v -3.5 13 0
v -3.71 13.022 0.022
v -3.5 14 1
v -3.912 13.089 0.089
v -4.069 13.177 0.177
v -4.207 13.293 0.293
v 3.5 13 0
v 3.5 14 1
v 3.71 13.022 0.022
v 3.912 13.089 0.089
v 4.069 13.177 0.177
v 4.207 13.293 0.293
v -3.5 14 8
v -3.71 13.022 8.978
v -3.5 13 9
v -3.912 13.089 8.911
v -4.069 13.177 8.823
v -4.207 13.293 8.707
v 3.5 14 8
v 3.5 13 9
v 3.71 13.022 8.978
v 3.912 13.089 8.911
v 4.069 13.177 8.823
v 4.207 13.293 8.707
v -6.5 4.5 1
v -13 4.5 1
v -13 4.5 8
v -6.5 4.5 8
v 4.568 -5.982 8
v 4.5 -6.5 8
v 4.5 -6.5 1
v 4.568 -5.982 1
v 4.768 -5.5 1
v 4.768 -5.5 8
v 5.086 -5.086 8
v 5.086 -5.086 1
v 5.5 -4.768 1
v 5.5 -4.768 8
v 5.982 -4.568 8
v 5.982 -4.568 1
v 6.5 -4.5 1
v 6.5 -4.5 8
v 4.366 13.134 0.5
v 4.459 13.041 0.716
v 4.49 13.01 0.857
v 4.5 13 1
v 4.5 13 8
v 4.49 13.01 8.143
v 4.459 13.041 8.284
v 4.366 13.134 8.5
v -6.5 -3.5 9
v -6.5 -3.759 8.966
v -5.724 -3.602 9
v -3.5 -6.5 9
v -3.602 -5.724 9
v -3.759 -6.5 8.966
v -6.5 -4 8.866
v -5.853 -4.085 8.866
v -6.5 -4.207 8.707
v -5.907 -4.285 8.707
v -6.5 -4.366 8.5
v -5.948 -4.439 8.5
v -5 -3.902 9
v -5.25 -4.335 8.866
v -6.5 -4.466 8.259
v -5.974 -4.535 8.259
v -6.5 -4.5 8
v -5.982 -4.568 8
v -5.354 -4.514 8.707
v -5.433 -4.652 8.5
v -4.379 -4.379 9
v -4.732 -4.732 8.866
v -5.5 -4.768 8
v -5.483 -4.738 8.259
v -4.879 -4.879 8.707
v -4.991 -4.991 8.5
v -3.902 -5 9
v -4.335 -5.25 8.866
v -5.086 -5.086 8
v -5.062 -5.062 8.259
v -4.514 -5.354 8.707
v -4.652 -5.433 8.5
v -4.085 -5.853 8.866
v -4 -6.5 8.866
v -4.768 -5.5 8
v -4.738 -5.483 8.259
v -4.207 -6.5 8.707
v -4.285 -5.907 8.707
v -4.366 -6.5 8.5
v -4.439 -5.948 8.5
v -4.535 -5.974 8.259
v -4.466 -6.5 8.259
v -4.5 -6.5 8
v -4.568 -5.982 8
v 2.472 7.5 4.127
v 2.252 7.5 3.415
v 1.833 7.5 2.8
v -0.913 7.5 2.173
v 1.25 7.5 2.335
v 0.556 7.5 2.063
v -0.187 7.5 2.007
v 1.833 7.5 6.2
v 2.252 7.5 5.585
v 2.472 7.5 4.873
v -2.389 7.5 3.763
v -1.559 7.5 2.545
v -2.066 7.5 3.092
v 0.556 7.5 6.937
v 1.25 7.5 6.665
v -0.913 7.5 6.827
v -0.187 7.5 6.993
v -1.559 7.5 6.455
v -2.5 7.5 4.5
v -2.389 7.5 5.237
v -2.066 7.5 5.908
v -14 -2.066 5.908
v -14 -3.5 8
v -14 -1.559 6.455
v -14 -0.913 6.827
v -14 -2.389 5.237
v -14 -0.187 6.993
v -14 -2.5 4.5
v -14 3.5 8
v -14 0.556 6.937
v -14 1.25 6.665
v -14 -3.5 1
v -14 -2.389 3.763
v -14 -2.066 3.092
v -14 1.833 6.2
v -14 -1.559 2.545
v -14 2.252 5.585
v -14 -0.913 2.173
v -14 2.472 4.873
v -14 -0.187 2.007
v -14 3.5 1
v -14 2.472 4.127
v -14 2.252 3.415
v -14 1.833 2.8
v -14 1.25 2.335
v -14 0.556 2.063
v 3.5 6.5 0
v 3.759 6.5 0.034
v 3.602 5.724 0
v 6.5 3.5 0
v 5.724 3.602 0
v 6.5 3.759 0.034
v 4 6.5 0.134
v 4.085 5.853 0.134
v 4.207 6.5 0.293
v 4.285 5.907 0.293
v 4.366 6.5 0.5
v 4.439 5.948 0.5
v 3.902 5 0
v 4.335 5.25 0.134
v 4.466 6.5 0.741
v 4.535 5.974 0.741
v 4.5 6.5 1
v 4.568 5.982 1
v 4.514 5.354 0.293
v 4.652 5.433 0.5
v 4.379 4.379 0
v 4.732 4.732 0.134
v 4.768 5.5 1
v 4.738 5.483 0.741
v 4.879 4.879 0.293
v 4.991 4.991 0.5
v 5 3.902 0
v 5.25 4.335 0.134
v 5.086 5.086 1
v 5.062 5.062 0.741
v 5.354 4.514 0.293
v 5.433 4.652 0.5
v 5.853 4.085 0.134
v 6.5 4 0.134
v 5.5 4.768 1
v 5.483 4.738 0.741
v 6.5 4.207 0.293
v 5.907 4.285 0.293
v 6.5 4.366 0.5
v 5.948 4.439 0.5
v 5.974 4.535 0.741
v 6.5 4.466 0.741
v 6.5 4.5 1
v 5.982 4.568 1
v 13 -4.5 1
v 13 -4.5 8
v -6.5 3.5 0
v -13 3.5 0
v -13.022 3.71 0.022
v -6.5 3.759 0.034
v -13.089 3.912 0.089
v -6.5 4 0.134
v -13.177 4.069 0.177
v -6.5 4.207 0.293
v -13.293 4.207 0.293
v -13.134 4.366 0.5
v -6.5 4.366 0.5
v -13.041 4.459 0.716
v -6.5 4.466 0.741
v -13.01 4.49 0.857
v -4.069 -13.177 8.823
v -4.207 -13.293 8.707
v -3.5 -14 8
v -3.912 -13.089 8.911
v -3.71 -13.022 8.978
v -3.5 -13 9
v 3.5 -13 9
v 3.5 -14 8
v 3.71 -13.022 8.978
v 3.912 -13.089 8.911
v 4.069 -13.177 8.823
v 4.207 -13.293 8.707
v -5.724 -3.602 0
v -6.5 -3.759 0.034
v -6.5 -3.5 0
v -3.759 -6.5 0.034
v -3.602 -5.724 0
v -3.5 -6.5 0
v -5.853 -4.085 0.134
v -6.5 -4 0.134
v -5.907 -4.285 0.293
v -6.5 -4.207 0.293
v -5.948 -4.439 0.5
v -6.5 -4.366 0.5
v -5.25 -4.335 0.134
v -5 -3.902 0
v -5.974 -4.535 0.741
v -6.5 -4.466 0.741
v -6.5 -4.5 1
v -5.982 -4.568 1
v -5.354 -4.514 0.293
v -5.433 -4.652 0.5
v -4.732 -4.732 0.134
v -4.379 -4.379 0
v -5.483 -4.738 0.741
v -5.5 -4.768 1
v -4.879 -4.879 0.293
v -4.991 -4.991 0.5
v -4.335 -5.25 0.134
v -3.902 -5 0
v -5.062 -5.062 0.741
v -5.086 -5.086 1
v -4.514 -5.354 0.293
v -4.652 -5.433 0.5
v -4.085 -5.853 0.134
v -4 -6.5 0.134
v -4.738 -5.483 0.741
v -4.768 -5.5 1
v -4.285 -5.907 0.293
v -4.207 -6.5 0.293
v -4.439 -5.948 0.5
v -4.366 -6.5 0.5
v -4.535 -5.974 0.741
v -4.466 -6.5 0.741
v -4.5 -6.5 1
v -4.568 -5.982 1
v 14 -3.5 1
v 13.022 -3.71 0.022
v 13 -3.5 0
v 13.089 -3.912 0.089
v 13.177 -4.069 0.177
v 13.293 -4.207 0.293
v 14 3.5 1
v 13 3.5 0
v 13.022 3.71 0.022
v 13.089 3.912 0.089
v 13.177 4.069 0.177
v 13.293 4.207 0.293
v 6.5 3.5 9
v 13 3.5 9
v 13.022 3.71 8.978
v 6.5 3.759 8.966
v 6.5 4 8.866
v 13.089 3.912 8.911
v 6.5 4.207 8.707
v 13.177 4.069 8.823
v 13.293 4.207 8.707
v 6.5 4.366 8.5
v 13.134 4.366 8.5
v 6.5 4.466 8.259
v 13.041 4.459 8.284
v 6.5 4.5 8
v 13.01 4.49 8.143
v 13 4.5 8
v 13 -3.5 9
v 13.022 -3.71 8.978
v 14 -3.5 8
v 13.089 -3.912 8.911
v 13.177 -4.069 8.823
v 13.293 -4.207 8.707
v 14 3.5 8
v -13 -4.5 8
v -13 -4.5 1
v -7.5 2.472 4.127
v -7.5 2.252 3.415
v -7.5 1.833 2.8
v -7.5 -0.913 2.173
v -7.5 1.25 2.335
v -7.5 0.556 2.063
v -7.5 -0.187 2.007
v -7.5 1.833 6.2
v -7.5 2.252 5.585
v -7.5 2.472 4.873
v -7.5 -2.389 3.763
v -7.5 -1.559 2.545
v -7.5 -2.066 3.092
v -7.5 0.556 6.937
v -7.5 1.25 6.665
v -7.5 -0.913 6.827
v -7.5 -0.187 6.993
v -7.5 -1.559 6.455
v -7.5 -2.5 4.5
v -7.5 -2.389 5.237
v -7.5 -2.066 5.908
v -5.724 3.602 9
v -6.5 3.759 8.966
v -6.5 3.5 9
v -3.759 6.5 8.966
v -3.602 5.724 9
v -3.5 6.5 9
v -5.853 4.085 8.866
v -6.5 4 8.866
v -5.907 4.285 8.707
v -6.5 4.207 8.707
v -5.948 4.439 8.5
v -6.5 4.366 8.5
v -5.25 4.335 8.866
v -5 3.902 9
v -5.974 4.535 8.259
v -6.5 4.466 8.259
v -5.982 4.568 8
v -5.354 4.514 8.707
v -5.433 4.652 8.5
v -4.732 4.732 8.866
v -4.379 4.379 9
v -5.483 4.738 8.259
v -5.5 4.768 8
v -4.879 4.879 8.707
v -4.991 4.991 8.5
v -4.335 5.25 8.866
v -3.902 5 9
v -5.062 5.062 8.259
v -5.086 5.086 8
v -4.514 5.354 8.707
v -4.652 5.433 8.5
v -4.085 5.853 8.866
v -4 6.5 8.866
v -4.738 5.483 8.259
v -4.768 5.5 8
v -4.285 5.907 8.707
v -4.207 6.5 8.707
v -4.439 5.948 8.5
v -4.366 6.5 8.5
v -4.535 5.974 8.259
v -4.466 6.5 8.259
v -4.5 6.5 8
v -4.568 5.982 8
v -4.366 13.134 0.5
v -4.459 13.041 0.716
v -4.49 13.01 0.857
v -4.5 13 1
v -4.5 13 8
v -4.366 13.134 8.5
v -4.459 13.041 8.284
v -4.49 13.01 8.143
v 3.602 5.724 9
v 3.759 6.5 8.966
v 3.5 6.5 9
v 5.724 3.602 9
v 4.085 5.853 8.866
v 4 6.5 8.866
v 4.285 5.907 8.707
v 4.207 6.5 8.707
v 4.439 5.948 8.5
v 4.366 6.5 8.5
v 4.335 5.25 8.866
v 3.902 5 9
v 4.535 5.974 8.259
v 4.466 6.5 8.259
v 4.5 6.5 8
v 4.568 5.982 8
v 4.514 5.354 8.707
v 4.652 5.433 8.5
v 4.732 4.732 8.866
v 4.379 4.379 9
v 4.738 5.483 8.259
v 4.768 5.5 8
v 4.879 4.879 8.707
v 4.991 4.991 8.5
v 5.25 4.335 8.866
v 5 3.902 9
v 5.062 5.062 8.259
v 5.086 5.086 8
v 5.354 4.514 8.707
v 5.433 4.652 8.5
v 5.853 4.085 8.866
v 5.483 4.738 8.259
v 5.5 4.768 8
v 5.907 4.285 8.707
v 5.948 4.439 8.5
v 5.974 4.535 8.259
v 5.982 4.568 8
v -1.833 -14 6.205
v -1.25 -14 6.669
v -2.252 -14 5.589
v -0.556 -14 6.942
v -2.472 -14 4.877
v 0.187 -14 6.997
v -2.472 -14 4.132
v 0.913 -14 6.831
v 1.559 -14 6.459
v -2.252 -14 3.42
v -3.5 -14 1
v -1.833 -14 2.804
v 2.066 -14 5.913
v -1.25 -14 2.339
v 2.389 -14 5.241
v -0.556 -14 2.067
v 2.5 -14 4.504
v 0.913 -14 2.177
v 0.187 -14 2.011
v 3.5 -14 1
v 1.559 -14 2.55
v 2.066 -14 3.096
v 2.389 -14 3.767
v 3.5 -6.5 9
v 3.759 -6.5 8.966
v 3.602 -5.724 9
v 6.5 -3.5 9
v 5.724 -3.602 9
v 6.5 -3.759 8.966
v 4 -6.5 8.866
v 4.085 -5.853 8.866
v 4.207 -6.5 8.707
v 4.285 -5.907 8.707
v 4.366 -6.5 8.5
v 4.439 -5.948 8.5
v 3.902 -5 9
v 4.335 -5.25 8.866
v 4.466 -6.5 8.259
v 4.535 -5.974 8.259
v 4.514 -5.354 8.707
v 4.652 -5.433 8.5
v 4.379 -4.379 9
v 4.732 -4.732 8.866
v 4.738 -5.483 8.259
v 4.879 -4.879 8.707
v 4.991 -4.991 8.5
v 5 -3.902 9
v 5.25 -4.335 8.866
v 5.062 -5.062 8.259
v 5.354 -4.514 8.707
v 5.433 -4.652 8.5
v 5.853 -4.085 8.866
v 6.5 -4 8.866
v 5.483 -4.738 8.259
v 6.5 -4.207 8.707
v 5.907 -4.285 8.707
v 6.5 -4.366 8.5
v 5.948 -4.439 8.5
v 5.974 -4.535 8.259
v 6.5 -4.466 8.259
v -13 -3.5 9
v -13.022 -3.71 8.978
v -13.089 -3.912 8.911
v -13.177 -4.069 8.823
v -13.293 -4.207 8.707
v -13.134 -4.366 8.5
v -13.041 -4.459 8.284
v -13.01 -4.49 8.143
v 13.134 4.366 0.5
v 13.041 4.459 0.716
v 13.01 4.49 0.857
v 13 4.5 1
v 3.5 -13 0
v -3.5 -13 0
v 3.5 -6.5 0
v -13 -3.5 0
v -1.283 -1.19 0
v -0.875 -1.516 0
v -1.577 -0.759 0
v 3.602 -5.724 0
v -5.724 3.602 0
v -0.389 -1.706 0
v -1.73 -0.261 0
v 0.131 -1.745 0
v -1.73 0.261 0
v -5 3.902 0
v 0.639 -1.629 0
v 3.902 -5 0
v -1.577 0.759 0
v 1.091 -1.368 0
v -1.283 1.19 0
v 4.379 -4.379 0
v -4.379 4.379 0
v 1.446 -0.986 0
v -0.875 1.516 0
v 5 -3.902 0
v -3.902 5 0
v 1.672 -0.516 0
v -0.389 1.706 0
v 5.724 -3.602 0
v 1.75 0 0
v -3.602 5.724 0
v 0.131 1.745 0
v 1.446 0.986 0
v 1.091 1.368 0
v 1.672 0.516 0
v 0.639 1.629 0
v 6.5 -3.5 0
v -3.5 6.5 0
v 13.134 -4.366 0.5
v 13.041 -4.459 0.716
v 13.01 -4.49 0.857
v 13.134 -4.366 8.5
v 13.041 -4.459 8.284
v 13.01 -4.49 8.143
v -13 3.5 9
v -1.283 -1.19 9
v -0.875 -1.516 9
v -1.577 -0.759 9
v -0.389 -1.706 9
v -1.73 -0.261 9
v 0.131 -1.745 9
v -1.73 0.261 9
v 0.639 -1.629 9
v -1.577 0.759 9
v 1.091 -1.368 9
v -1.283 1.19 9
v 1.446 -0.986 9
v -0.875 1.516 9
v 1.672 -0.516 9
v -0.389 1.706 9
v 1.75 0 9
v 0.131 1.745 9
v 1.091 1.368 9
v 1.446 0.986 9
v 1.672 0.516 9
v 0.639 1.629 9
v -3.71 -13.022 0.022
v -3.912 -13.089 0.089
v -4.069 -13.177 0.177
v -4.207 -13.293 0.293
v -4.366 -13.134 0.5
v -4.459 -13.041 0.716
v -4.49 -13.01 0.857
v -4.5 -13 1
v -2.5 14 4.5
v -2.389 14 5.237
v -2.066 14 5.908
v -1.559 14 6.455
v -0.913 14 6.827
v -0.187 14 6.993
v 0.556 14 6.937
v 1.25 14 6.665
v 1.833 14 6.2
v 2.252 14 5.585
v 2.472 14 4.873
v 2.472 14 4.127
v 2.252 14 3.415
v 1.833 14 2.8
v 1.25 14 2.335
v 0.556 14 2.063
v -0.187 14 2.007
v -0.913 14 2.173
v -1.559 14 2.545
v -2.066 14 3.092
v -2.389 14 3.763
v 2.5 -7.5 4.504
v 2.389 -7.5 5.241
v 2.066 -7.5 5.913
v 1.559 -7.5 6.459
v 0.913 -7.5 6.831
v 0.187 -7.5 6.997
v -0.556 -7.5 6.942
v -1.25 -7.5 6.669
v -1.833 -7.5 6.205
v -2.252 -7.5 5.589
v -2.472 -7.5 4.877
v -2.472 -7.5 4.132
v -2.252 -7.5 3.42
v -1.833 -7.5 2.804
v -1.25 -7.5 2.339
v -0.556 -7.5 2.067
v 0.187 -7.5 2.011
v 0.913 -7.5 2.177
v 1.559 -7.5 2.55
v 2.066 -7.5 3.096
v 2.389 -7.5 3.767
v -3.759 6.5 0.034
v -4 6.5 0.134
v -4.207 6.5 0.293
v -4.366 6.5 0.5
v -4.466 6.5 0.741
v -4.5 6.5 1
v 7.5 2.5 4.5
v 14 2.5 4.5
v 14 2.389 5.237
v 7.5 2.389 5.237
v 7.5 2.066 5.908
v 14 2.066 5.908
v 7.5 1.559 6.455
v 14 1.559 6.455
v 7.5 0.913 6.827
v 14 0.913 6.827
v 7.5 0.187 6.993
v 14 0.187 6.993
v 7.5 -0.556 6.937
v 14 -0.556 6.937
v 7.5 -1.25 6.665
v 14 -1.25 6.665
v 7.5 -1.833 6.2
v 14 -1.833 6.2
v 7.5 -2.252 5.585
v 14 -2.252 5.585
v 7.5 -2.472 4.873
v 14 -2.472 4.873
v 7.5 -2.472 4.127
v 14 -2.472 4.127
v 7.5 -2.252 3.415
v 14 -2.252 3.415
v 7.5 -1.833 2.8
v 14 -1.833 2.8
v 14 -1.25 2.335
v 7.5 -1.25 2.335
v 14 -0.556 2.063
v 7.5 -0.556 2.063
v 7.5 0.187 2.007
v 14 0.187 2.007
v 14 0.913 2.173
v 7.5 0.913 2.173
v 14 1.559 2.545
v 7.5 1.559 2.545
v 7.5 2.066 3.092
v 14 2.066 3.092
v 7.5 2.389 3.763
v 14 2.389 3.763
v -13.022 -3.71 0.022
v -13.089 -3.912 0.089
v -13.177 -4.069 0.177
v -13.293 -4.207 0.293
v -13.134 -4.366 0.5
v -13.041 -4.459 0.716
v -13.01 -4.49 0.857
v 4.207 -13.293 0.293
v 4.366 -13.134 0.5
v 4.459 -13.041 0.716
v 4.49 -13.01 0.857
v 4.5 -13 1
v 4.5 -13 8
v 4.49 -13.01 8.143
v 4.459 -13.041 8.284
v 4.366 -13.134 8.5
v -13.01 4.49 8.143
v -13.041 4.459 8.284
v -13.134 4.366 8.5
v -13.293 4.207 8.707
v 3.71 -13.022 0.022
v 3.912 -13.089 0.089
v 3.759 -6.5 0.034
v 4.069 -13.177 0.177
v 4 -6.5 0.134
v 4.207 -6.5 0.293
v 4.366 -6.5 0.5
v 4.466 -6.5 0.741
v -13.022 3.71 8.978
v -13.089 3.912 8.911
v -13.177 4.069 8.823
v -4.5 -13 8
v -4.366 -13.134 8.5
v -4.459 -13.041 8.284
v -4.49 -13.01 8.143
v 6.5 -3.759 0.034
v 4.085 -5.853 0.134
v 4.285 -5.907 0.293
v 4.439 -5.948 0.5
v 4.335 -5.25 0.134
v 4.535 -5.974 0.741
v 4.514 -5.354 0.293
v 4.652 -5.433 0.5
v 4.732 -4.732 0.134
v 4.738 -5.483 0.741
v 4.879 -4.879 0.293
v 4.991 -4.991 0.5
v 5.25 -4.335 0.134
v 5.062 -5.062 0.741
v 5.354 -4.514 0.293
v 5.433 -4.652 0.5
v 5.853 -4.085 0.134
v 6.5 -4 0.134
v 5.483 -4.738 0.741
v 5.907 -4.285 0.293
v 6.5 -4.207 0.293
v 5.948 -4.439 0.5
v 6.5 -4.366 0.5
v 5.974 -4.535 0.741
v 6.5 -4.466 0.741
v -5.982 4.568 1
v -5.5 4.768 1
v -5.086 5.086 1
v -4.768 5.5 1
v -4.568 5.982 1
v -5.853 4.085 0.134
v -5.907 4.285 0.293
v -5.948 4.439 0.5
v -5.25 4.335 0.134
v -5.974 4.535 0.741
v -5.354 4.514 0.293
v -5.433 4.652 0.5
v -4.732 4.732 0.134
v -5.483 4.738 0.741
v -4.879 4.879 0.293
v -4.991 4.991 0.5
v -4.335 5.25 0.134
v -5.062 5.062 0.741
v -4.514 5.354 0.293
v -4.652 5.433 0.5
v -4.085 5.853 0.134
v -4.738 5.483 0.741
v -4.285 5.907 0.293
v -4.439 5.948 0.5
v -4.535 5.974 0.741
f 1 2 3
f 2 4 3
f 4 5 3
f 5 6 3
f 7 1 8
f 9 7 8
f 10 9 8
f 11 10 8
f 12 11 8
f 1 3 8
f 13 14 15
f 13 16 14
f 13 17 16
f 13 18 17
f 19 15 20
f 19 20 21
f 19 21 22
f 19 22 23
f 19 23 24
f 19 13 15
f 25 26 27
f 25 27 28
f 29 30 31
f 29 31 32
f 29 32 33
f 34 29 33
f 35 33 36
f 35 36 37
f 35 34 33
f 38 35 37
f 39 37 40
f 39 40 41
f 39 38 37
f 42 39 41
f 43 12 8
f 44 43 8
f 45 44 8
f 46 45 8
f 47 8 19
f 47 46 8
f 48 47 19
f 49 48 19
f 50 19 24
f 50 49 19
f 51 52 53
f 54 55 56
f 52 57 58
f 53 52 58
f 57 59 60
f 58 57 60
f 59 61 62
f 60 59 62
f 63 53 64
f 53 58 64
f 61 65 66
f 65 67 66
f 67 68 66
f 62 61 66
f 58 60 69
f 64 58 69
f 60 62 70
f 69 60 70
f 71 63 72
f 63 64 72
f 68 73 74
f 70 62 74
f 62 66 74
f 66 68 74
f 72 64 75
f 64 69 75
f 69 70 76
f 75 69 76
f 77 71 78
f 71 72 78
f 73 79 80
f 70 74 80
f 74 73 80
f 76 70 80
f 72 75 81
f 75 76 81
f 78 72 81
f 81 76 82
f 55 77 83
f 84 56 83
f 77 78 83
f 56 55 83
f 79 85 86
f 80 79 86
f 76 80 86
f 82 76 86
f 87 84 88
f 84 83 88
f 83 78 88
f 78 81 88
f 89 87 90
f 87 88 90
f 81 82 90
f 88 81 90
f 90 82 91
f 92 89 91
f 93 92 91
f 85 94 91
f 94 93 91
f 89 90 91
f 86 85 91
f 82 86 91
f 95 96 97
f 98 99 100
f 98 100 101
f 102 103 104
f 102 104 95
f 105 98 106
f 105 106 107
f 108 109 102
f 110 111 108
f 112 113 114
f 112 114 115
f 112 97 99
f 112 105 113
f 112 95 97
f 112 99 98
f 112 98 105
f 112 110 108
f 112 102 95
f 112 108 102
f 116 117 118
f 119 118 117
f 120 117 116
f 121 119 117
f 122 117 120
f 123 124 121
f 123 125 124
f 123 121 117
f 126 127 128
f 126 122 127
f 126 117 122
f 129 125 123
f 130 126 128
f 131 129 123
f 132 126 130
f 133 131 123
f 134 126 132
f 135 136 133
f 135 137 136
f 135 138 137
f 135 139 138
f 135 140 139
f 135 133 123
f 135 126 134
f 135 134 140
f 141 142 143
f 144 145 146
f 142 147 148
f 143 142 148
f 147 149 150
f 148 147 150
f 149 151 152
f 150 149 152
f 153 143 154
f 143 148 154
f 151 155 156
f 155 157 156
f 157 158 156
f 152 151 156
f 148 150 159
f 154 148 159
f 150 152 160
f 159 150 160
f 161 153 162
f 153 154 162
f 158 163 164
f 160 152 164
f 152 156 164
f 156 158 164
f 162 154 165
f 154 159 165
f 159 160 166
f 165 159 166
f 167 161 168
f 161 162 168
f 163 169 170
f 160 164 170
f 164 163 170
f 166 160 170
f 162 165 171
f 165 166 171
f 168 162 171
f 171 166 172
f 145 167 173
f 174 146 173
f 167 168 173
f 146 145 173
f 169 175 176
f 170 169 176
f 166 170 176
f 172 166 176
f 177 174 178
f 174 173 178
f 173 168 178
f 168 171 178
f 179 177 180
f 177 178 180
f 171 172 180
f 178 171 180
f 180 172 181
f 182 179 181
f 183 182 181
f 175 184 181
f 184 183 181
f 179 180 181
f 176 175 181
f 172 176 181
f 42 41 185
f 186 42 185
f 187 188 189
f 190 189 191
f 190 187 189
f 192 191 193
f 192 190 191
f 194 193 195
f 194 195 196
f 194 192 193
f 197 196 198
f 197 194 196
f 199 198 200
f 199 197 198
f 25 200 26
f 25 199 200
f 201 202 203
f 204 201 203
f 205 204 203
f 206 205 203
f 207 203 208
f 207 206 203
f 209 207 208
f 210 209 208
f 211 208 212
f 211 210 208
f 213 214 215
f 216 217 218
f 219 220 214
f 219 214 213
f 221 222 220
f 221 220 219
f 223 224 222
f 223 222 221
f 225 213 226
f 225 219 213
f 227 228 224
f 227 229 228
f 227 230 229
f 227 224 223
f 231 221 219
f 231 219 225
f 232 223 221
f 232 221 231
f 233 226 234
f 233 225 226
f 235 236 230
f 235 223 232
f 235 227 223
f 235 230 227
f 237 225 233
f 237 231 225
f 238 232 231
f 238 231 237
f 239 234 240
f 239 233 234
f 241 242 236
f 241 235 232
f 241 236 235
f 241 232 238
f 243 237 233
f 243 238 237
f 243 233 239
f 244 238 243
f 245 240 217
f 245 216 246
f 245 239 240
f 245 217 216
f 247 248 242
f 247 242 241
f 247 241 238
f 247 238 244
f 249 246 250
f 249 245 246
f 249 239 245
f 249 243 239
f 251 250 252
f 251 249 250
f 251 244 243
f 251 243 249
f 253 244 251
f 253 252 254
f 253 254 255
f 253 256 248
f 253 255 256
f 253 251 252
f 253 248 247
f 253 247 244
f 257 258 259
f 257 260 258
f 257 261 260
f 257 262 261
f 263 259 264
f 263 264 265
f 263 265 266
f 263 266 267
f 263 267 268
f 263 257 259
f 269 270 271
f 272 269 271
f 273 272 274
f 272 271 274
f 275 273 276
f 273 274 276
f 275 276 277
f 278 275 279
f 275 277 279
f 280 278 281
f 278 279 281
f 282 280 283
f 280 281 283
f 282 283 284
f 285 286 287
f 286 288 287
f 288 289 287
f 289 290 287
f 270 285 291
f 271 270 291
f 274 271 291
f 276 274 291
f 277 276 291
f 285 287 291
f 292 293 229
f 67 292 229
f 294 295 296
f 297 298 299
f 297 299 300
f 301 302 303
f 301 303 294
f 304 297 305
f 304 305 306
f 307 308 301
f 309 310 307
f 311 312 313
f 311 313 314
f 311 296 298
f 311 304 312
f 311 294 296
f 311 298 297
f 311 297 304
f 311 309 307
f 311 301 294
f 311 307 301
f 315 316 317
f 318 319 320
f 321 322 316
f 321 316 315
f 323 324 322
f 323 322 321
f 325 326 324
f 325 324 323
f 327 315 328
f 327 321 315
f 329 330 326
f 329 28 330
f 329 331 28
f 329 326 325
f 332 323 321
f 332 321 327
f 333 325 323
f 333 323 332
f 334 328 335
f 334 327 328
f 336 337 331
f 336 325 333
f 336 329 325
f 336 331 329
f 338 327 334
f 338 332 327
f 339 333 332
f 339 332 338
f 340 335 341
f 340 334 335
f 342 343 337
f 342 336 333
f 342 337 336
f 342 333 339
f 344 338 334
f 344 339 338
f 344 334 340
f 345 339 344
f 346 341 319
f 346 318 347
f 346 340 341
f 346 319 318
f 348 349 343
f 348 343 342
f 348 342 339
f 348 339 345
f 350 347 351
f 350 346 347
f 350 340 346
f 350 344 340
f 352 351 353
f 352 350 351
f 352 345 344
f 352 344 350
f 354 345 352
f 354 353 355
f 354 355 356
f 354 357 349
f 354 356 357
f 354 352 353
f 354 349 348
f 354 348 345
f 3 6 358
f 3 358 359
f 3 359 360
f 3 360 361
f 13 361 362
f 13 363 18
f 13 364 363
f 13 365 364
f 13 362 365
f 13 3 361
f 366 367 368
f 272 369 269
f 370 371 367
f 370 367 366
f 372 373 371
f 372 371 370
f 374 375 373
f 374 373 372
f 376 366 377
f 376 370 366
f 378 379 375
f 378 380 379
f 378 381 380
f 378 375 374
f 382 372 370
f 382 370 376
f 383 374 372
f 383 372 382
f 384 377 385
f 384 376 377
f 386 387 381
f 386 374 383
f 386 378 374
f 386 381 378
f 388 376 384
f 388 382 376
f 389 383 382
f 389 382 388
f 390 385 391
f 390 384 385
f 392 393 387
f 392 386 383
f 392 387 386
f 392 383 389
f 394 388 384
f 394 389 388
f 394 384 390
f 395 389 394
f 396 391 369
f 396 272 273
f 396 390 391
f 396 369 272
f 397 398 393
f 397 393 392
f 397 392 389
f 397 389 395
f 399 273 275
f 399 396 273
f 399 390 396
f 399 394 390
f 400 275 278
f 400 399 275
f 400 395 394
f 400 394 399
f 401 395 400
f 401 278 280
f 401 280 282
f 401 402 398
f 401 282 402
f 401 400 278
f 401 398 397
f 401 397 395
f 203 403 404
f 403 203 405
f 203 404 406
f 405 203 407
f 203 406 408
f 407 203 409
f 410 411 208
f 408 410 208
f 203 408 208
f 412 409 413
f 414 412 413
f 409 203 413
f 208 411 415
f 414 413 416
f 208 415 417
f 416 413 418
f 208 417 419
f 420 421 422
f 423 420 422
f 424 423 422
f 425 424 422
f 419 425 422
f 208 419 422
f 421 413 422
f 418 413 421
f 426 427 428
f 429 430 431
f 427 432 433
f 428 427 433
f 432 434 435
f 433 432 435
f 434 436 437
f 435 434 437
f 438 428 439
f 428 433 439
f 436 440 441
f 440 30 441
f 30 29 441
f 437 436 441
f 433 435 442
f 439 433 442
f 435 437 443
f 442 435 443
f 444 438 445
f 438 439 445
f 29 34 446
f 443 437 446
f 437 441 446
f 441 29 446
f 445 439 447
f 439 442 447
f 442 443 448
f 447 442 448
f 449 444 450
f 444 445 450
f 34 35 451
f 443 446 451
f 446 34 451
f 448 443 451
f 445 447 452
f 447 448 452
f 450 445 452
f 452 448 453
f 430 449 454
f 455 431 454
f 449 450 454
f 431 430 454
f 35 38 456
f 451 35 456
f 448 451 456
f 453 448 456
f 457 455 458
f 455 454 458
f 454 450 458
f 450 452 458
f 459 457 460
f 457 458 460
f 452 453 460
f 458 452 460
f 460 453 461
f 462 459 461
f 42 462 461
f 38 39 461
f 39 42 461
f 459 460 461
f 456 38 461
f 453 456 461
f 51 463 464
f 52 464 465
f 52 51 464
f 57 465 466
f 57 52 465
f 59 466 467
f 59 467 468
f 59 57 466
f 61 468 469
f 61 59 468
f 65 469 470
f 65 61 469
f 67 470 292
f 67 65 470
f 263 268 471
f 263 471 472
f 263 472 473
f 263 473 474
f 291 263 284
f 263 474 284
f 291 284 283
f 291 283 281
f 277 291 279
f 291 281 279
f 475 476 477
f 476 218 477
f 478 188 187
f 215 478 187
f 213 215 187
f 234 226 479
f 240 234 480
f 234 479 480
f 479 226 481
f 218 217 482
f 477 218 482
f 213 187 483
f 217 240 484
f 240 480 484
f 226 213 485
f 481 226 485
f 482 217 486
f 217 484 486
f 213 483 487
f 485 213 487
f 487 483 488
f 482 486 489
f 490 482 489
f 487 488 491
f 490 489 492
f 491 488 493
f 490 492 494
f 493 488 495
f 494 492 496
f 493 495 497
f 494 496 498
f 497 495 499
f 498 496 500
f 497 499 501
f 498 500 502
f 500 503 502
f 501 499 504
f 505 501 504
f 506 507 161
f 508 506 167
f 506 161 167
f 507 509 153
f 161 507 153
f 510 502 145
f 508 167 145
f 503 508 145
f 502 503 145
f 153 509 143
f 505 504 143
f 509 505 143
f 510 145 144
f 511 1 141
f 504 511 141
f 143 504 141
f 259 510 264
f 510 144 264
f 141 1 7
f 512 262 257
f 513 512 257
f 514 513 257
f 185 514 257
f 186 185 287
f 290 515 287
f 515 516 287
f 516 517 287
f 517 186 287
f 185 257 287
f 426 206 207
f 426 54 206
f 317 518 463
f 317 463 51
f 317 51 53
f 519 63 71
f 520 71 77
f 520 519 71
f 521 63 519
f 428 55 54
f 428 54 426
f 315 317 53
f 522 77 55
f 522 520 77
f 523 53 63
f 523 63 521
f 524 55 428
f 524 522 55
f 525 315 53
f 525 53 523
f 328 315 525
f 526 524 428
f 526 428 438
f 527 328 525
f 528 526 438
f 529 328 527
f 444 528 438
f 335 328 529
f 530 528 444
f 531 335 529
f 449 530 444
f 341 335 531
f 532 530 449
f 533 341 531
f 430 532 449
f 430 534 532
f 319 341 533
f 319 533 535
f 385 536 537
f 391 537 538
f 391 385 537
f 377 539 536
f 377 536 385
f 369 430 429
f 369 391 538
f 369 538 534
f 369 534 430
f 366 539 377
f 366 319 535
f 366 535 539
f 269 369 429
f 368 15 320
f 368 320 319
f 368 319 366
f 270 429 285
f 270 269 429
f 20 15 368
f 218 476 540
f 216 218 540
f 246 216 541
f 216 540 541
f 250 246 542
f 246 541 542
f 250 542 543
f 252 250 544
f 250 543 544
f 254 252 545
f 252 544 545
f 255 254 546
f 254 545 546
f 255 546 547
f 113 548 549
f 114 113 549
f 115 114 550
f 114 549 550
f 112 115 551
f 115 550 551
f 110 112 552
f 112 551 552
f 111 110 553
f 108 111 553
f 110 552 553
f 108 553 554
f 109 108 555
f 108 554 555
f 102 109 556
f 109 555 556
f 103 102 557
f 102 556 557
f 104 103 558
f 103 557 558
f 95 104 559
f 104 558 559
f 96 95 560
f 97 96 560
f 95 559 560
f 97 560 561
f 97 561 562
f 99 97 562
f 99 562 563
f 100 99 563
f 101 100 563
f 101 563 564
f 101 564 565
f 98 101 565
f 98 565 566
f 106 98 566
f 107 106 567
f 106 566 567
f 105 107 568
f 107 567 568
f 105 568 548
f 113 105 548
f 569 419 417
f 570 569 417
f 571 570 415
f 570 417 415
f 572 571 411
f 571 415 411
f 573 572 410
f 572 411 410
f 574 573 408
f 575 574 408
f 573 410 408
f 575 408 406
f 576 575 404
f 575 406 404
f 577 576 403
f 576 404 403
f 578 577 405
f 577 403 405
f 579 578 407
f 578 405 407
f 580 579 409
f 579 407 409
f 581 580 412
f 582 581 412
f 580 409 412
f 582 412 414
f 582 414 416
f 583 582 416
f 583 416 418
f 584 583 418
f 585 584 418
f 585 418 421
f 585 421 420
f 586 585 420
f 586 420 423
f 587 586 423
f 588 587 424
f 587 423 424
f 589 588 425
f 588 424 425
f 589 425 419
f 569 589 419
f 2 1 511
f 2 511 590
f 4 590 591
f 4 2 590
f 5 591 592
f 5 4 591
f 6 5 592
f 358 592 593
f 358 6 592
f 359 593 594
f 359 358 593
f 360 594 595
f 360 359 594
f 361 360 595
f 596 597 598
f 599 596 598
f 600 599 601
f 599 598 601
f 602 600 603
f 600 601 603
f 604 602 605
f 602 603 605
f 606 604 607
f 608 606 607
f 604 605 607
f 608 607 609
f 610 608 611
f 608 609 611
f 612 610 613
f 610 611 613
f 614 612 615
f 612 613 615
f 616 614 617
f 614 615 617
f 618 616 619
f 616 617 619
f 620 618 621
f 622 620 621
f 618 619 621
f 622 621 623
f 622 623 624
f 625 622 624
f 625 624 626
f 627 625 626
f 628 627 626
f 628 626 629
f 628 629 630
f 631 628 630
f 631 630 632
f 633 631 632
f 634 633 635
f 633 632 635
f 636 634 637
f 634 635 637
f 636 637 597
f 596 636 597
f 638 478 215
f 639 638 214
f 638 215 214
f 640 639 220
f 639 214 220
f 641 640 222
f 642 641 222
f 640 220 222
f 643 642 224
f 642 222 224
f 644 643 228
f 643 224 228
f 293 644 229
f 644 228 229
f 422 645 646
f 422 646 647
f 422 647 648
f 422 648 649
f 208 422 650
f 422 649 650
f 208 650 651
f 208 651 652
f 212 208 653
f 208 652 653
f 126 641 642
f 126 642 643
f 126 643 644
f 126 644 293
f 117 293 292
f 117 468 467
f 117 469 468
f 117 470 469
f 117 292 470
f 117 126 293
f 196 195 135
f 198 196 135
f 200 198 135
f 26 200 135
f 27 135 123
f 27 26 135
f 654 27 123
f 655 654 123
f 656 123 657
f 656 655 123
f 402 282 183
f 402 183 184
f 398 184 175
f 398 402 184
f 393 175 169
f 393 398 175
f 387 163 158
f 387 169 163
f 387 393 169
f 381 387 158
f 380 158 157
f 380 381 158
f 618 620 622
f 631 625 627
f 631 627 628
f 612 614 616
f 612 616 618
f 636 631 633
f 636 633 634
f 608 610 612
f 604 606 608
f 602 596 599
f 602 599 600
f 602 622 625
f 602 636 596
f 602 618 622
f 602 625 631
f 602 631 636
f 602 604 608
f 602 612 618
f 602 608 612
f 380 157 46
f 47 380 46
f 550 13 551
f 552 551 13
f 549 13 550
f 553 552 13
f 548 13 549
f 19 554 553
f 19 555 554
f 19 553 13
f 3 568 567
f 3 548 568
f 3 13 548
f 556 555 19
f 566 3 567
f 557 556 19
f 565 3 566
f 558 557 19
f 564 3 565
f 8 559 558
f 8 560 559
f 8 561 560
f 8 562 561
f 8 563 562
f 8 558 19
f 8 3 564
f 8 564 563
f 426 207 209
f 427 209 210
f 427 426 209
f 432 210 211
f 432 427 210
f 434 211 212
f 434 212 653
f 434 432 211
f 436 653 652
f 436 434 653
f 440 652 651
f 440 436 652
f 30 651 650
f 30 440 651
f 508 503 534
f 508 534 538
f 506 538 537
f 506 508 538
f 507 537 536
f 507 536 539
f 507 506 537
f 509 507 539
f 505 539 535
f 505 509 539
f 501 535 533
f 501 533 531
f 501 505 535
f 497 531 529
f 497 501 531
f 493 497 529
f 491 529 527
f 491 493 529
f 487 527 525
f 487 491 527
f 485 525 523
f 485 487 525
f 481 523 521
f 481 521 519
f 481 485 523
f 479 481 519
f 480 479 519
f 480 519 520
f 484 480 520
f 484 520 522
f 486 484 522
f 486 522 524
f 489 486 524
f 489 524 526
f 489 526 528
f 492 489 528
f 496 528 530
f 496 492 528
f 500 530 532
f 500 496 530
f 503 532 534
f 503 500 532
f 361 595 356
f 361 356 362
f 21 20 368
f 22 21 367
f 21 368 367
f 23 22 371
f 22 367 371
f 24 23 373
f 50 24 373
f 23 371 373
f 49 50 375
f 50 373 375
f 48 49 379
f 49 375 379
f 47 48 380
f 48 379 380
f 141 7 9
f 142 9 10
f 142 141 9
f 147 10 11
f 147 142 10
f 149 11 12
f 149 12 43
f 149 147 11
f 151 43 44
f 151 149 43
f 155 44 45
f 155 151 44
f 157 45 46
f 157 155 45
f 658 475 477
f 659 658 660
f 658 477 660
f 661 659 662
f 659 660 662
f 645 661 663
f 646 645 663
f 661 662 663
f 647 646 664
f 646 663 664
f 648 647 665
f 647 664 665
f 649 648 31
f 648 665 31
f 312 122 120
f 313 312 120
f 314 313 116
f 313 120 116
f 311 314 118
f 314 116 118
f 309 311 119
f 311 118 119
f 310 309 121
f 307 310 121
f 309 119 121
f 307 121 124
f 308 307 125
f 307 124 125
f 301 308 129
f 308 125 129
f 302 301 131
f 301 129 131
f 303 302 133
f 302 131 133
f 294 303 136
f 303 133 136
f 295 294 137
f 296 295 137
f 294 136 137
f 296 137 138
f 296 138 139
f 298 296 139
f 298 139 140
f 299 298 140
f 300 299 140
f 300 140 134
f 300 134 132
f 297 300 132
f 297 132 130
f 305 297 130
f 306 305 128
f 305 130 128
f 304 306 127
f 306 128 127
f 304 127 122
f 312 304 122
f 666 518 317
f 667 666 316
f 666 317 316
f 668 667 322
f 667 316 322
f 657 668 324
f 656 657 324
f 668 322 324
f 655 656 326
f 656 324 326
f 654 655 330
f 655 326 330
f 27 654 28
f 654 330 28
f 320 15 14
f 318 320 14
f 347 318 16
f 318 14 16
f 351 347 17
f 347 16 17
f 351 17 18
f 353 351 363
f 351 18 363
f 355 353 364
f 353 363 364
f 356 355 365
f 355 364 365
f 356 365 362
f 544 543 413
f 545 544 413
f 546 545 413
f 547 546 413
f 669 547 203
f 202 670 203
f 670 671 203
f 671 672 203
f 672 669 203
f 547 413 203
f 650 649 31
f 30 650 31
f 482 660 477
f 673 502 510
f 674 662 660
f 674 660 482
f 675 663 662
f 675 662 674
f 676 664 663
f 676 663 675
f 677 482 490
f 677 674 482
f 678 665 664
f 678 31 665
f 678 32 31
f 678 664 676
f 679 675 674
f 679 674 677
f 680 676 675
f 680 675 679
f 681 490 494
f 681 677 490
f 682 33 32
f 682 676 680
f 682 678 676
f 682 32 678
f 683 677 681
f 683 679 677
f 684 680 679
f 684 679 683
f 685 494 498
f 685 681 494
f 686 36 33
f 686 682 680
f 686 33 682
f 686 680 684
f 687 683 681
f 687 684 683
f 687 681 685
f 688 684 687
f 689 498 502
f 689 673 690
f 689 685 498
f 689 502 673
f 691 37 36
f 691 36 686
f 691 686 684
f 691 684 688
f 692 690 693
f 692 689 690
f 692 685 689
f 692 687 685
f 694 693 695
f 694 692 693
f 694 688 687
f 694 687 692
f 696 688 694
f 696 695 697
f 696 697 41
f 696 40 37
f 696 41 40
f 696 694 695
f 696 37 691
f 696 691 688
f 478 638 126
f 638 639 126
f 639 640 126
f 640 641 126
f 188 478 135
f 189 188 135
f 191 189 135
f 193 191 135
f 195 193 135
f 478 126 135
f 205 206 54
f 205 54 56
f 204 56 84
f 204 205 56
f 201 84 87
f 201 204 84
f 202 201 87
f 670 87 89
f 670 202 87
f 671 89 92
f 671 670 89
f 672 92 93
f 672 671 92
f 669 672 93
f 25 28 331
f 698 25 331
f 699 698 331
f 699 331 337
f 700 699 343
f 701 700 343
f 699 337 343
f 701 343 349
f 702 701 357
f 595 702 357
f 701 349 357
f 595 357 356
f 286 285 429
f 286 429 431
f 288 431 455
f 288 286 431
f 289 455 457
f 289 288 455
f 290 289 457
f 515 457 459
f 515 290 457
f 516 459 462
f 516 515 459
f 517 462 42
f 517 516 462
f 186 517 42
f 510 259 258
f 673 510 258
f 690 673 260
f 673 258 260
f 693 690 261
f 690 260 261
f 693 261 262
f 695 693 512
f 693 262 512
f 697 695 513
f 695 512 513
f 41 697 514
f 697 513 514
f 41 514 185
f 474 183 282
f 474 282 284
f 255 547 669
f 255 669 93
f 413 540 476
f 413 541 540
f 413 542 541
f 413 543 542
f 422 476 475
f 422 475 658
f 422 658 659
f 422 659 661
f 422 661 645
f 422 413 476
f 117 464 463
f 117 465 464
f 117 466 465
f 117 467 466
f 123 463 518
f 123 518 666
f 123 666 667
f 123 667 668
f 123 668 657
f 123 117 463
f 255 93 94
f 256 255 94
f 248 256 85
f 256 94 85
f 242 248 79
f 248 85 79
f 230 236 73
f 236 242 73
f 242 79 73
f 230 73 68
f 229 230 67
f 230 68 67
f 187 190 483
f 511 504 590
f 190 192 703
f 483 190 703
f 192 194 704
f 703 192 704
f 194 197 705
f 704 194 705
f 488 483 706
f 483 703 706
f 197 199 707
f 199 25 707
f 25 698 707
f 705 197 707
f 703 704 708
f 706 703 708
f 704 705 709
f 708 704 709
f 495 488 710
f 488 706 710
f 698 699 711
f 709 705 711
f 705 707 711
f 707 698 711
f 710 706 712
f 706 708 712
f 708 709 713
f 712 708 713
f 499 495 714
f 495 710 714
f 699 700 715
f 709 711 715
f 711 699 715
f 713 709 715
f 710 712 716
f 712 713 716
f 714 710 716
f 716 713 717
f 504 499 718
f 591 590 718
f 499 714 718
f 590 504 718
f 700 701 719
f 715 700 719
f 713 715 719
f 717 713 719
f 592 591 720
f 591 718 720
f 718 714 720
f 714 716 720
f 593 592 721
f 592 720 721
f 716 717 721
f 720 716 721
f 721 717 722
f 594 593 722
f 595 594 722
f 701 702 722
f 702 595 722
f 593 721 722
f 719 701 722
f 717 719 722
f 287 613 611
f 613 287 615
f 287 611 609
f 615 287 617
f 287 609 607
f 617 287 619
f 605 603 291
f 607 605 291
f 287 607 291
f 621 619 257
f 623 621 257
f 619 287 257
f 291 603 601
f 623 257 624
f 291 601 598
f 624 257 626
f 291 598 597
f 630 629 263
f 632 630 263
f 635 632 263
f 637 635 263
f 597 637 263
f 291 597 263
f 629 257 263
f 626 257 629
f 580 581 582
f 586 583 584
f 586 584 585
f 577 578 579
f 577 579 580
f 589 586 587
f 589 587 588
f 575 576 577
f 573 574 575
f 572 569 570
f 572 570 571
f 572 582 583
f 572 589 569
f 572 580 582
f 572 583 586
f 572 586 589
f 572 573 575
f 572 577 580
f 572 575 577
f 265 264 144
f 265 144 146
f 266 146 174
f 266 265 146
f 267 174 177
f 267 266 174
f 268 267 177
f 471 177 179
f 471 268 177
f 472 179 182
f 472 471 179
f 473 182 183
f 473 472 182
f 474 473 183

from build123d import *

# Parameters (mm, degrees)
F0_W     = 9
F0_H     = 9.5
F0_W_2   = 9.5
F0_H_2   = 9
F0_R     = 1.75
F1_DEPTH = 9
F4_R     = 2.5
F6_DEPTH = 6.5
F3_R     = 2.5
F7_DEPTH = 6.5
F5_R     = 2.5
F8_DEPTH = 6.5
F2_R     = 2.5
F9_DEPTH = 6.5
F10_R    = 2
F11_SIZE = 1
F12_R    = 1


with BuildPart() as f1:
    # F0 (on Top) → F1 (new body)
    with BuildSketch(Plane.XY):
        with Locations((0, -9.25)):
            Rectangle(F0_W, F0_H)
        with Locations((9.25, 0)):
            Rectangle(F0_W_2, F0_H_2)
        with Locations((-9.25, 0)):
            Rectangle(F0_W_2, F0_H_2)
        with Locations((0, 9.25)):
            Rectangle(F0_W, F0_H)
        Rectangle(F0_W, F0_H_2)
        Circle(F0_R, mode=Mode.SUBTRACT)
    extrude(amount=F1_DEPTH)

    # F4 (on face) → F6 (cut)
    with BuildSketch(Plane(origin=(-14, 0, 0), x_dir=(0, -1, 0), z_dir=(-1, 0, 0))):
        with Locations((0, 4.4999998063)):
            Circle(F4_R)
    extrude(amount=-F6_DEPTH, mode=Mode.SUBTRACT)

    # F3 (on face) → F7 (cut)
    with BuildSketch(Plane.YZ.offset(14)):
        with Locations((0, 4.5)):
            Circle(F3_R)
    extrude(amount=-F7_DEPTH, mode=Mode.SUBTRACT)

    # F5 (on face) → F8 (cut)
    with BuildSketch(Plane.XZ.offset(14)):
        with Locations((0, 4.5042946003)):
            Circle(F5_R)
    extrude(amount=-F8_DEPTH, mode=Mode.SUBTRACT)

    # F2 (on face) → F9 (cut)
    with BuildSketch(Plane(origin=(0, 14, 0), x_dir=(-1, 0, 0), z_dir=(0, 1, 0))):
        with Locations((0, 4.5)):
            Circle(F2_R)
    extrude(amount=-F9_DEPTH, mode=Mode.SUBTRACT)

    # F10
    f10_edges = [f1.edges().sort_by_distance(p)[0] for p in [
        (-4.5, 4.5, 4.5),
        (-4.5, -4.5, 4.5),
        (4.5, -4.5, 4.5),
        (4.5, 4.5, 4.5),
    ]]
    fillet(f10_edges, radius=F10_R)

    # F11
    f11_edges = [f1.edges().sort_by_distance(p)[0] for p in [
        (14, 4.5, 4.5),
        (4.5, 14, 4.5),
        (-4.5, 14, 4.5),
        (-14, 4.5, 4.5),
        (-14, -4.5, 4.5),
        (-4.5, -14, 4.5),
        (4.5, -14, 4.5),
        (14, -4.5, 4.5),
        (14, 0, 0),
        (0, 14, 0),
        (-14, 0, 0),
        (0, -14, 0),
        (-14, 0, 9),
        (0, 14, 9),
        (0, -14, 9),
        (14, 0, 9),
    ]]
    chamfer(f11_edges, length=F11_SIZE)

    # F12
    f12_edges = [f1.edges().sort_by_distance(p)[0] for p in [
        (-9.75, -4.5, 9),
        (-9.75, 4.5, 9),
        (-4.5, -9.75, 9),
        (4.5, -9.75, 9),
        (9.75, -4.5, 9),
        (9.75, 4.5, 9),
        (4.5, 9.75, 9),
        (-4.5, 9.75, 9),
        (-9.75, 4.5, 0),
        (-9.75, -4.5, 0),
        (-4.5, -9.75, 0),
        (4.5, -9.75, 0),
        (9.75, -4.5, 0),
        (9.75, 4.5, 0),
        (4.5, 9.75, 0),
        (-4.5, 9.75, 0),
    ]]
    fillet(f12_edges, radius=F12_R)


solid = f1.part
